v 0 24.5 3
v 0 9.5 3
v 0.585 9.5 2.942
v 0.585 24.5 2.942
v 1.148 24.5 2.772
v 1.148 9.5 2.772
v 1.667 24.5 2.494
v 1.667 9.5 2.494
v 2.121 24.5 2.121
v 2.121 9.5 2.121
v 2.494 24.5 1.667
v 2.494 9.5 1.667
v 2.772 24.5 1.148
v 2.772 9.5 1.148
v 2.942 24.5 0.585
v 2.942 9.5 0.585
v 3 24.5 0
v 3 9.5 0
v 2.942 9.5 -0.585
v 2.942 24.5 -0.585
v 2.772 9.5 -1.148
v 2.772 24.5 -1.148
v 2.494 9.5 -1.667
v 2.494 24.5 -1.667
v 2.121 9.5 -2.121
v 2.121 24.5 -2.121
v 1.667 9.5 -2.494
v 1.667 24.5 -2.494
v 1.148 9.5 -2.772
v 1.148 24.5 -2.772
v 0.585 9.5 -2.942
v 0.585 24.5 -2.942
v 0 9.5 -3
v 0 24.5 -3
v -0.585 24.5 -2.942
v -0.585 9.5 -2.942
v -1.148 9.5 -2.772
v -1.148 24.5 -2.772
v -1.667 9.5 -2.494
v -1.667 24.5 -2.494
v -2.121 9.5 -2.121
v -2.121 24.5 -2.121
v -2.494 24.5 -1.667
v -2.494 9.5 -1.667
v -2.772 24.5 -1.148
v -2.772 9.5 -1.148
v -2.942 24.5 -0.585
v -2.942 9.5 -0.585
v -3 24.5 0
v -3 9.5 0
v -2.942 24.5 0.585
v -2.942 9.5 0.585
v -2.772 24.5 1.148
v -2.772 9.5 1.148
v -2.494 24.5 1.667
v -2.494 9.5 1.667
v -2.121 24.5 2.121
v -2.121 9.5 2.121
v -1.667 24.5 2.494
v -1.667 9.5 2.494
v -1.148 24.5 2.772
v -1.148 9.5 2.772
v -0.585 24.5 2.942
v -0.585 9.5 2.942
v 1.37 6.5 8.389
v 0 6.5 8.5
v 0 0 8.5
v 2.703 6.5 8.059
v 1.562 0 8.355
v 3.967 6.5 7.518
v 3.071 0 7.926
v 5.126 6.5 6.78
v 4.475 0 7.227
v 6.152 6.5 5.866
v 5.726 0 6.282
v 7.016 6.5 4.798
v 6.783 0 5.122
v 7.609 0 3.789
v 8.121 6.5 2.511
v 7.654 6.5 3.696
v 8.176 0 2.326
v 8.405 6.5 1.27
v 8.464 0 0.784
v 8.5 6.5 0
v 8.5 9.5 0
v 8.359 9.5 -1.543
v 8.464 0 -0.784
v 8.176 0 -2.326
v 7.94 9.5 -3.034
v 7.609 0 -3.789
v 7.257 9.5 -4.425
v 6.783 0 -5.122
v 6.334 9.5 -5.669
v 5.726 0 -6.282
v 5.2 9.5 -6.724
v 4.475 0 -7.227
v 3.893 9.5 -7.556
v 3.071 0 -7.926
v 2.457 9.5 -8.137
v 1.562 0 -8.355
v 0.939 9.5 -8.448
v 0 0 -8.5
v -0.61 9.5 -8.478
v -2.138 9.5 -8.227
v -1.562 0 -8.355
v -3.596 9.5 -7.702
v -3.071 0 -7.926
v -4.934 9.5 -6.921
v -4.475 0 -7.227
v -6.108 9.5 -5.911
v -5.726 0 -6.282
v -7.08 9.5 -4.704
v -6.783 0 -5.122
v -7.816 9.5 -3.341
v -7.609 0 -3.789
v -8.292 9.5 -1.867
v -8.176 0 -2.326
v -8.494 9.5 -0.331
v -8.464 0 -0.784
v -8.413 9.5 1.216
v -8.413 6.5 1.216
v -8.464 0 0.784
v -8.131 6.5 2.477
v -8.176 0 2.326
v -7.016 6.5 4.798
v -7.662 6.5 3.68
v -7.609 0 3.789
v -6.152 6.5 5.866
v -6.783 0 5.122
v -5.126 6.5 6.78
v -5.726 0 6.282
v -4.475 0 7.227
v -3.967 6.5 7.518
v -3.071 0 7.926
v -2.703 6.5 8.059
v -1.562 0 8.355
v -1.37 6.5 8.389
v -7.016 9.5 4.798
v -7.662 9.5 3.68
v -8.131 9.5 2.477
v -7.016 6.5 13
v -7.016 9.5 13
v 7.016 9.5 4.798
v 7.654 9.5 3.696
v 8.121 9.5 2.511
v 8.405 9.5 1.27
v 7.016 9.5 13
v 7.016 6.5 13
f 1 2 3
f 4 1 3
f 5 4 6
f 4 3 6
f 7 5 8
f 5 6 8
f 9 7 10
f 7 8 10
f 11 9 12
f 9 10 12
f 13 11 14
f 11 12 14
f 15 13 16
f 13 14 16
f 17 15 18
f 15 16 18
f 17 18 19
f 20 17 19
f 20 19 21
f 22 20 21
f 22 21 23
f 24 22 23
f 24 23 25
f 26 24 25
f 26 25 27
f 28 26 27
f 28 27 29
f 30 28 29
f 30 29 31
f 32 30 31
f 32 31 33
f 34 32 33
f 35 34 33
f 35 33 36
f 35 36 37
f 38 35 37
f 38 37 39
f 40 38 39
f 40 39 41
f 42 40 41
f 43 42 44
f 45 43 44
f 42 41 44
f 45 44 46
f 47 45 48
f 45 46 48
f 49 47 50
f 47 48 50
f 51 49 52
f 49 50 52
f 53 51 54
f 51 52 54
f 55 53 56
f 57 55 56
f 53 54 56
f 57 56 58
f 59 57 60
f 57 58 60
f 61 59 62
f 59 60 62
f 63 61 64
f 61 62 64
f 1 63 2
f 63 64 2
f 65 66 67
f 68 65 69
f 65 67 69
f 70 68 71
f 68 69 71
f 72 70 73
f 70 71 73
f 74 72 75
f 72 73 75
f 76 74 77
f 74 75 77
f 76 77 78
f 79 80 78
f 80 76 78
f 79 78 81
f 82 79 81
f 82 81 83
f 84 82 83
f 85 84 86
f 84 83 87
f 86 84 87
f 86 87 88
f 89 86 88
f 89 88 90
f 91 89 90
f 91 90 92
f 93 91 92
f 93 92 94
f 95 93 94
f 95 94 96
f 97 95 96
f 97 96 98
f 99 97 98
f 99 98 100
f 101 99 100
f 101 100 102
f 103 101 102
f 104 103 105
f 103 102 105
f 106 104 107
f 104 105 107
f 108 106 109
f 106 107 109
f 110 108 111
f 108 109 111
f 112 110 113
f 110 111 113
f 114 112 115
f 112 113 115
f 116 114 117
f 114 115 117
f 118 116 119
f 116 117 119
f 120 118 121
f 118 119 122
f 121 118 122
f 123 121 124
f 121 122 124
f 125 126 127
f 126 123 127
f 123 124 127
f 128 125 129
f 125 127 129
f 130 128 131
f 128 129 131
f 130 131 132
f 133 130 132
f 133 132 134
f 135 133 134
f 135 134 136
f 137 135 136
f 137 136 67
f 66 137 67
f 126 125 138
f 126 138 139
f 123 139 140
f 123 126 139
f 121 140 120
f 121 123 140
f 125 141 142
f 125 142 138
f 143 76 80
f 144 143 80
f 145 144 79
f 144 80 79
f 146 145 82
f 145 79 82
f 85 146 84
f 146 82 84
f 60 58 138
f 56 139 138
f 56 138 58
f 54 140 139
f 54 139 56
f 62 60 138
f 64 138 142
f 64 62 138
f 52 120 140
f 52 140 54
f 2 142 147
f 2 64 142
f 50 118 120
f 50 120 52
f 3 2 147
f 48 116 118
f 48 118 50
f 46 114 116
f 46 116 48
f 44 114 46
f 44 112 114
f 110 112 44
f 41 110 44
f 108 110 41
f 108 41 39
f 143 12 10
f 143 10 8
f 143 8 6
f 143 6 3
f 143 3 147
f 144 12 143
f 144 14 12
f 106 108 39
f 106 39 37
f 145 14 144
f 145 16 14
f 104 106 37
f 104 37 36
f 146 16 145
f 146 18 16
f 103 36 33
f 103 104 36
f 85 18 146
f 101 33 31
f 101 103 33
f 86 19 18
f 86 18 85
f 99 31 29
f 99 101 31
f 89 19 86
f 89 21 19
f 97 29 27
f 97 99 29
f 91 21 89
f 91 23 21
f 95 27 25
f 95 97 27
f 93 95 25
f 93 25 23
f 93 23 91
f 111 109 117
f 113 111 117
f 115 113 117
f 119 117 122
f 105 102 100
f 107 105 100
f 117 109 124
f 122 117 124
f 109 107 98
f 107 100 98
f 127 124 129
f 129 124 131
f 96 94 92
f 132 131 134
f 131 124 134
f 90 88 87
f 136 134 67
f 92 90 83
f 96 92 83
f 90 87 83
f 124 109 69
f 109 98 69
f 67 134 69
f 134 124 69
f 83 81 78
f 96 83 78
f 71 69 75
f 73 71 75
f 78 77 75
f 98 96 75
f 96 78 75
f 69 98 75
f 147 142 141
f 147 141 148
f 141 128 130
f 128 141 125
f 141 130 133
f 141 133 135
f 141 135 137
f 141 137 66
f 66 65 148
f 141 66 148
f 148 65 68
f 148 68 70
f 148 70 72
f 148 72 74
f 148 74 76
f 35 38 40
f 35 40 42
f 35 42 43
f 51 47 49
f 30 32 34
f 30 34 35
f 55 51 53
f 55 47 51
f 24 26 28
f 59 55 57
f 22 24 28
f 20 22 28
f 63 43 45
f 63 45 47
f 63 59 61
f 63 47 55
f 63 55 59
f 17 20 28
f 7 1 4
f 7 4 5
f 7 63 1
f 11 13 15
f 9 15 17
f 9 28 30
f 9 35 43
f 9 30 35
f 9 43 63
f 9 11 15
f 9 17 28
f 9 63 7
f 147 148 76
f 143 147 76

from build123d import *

# Parameters (mm, degrees)
SKETCH1_R           = 8.5
BOSS_EXTRUDE1_DEPTH = 9.5
SKETCH2_R           = 3
BOSS_EXTRUDE2_DEPTH = 15
SKETCH3_W           = 16.912520663
SKETCH3_H           = 13
BOSS_EXTRUDE3_DEPTH = 3
CUT_EXTRUDE2_DEPTH  = 24.774986856


with BuildPart() as part:
    # Sketch1 → Boss-Extrude1 (new body)
    with BuildSketch(Plane(origin=(0, 0, 0), x_dir=(1, 0, 0), z_dir=(0, 1, 0))):
        with Locations(Location((0, 0, 0), (0, 0, 270))):
            Circle(SKETCH1_R)
    extrude(amount=BOSS_EXTRUDE1_DEPTH)

    # Sketch2 → Boss-Extrude2 (add)
    with BuildSketch(Plane(origin=(0, 9.5, 0), x_dir=(1, 0, 0), z_dir=(0, 1, 0))):
        with Locations(Location((0, 0, 0), (0, 0, 270))):
            Circle(SKETCH2_R)
    extrude(amount=BOSS_EXTRUDE2_DEPTH)

    # Sketch3 → Boss-Extrude3 (add)
    with BuildSketch(Plane(origin=(0, 9.5, 0), x_dir=(1, 0, 0), z_dir=(0, 1, 0))):
        with Locations((0.043739668, -6.5)):
            Rectangle(SKETCH3_W, SKETCH3_H)
    extrude(amount=-BOSS_EXTRUDE3_DEPTH)

    # Sketch4 → Cut-Extrude2 (cut, through all)
    with BuildSketch(Plane.XZ.offset(-6.5)):
        with BuildLine():
            Line((-7.016472339, 13), (-7.016472339, 4.797824081))
            ThreePointArc((-7.016472339, 4.797824081), (-7.919608809, 3.087036818), (-8.412520663, 1.216345382))
            Line((-8.412520663, 1.216345382), (-8.412520663, 13))
            Line((-8.412520663, 13), (-7.016472339, 13))
        make_face()
        with BuildLine():
            Line((7.016472339, 13), (7.016472339, 4.797824081))
            ThreePointArc((7.016472339, 4.797824081), (8.120653141, 2.510974424), (8.5, 0))
            Line((8.5, 0), (8.5, 13))
            Line((8.5, 13), (7.016472339, 13))
        make_face()
    extrude(amount=-CUT_EXTRUDE2_DEPTH, mode=Mode.SUBTRACT)


solid = part.part
